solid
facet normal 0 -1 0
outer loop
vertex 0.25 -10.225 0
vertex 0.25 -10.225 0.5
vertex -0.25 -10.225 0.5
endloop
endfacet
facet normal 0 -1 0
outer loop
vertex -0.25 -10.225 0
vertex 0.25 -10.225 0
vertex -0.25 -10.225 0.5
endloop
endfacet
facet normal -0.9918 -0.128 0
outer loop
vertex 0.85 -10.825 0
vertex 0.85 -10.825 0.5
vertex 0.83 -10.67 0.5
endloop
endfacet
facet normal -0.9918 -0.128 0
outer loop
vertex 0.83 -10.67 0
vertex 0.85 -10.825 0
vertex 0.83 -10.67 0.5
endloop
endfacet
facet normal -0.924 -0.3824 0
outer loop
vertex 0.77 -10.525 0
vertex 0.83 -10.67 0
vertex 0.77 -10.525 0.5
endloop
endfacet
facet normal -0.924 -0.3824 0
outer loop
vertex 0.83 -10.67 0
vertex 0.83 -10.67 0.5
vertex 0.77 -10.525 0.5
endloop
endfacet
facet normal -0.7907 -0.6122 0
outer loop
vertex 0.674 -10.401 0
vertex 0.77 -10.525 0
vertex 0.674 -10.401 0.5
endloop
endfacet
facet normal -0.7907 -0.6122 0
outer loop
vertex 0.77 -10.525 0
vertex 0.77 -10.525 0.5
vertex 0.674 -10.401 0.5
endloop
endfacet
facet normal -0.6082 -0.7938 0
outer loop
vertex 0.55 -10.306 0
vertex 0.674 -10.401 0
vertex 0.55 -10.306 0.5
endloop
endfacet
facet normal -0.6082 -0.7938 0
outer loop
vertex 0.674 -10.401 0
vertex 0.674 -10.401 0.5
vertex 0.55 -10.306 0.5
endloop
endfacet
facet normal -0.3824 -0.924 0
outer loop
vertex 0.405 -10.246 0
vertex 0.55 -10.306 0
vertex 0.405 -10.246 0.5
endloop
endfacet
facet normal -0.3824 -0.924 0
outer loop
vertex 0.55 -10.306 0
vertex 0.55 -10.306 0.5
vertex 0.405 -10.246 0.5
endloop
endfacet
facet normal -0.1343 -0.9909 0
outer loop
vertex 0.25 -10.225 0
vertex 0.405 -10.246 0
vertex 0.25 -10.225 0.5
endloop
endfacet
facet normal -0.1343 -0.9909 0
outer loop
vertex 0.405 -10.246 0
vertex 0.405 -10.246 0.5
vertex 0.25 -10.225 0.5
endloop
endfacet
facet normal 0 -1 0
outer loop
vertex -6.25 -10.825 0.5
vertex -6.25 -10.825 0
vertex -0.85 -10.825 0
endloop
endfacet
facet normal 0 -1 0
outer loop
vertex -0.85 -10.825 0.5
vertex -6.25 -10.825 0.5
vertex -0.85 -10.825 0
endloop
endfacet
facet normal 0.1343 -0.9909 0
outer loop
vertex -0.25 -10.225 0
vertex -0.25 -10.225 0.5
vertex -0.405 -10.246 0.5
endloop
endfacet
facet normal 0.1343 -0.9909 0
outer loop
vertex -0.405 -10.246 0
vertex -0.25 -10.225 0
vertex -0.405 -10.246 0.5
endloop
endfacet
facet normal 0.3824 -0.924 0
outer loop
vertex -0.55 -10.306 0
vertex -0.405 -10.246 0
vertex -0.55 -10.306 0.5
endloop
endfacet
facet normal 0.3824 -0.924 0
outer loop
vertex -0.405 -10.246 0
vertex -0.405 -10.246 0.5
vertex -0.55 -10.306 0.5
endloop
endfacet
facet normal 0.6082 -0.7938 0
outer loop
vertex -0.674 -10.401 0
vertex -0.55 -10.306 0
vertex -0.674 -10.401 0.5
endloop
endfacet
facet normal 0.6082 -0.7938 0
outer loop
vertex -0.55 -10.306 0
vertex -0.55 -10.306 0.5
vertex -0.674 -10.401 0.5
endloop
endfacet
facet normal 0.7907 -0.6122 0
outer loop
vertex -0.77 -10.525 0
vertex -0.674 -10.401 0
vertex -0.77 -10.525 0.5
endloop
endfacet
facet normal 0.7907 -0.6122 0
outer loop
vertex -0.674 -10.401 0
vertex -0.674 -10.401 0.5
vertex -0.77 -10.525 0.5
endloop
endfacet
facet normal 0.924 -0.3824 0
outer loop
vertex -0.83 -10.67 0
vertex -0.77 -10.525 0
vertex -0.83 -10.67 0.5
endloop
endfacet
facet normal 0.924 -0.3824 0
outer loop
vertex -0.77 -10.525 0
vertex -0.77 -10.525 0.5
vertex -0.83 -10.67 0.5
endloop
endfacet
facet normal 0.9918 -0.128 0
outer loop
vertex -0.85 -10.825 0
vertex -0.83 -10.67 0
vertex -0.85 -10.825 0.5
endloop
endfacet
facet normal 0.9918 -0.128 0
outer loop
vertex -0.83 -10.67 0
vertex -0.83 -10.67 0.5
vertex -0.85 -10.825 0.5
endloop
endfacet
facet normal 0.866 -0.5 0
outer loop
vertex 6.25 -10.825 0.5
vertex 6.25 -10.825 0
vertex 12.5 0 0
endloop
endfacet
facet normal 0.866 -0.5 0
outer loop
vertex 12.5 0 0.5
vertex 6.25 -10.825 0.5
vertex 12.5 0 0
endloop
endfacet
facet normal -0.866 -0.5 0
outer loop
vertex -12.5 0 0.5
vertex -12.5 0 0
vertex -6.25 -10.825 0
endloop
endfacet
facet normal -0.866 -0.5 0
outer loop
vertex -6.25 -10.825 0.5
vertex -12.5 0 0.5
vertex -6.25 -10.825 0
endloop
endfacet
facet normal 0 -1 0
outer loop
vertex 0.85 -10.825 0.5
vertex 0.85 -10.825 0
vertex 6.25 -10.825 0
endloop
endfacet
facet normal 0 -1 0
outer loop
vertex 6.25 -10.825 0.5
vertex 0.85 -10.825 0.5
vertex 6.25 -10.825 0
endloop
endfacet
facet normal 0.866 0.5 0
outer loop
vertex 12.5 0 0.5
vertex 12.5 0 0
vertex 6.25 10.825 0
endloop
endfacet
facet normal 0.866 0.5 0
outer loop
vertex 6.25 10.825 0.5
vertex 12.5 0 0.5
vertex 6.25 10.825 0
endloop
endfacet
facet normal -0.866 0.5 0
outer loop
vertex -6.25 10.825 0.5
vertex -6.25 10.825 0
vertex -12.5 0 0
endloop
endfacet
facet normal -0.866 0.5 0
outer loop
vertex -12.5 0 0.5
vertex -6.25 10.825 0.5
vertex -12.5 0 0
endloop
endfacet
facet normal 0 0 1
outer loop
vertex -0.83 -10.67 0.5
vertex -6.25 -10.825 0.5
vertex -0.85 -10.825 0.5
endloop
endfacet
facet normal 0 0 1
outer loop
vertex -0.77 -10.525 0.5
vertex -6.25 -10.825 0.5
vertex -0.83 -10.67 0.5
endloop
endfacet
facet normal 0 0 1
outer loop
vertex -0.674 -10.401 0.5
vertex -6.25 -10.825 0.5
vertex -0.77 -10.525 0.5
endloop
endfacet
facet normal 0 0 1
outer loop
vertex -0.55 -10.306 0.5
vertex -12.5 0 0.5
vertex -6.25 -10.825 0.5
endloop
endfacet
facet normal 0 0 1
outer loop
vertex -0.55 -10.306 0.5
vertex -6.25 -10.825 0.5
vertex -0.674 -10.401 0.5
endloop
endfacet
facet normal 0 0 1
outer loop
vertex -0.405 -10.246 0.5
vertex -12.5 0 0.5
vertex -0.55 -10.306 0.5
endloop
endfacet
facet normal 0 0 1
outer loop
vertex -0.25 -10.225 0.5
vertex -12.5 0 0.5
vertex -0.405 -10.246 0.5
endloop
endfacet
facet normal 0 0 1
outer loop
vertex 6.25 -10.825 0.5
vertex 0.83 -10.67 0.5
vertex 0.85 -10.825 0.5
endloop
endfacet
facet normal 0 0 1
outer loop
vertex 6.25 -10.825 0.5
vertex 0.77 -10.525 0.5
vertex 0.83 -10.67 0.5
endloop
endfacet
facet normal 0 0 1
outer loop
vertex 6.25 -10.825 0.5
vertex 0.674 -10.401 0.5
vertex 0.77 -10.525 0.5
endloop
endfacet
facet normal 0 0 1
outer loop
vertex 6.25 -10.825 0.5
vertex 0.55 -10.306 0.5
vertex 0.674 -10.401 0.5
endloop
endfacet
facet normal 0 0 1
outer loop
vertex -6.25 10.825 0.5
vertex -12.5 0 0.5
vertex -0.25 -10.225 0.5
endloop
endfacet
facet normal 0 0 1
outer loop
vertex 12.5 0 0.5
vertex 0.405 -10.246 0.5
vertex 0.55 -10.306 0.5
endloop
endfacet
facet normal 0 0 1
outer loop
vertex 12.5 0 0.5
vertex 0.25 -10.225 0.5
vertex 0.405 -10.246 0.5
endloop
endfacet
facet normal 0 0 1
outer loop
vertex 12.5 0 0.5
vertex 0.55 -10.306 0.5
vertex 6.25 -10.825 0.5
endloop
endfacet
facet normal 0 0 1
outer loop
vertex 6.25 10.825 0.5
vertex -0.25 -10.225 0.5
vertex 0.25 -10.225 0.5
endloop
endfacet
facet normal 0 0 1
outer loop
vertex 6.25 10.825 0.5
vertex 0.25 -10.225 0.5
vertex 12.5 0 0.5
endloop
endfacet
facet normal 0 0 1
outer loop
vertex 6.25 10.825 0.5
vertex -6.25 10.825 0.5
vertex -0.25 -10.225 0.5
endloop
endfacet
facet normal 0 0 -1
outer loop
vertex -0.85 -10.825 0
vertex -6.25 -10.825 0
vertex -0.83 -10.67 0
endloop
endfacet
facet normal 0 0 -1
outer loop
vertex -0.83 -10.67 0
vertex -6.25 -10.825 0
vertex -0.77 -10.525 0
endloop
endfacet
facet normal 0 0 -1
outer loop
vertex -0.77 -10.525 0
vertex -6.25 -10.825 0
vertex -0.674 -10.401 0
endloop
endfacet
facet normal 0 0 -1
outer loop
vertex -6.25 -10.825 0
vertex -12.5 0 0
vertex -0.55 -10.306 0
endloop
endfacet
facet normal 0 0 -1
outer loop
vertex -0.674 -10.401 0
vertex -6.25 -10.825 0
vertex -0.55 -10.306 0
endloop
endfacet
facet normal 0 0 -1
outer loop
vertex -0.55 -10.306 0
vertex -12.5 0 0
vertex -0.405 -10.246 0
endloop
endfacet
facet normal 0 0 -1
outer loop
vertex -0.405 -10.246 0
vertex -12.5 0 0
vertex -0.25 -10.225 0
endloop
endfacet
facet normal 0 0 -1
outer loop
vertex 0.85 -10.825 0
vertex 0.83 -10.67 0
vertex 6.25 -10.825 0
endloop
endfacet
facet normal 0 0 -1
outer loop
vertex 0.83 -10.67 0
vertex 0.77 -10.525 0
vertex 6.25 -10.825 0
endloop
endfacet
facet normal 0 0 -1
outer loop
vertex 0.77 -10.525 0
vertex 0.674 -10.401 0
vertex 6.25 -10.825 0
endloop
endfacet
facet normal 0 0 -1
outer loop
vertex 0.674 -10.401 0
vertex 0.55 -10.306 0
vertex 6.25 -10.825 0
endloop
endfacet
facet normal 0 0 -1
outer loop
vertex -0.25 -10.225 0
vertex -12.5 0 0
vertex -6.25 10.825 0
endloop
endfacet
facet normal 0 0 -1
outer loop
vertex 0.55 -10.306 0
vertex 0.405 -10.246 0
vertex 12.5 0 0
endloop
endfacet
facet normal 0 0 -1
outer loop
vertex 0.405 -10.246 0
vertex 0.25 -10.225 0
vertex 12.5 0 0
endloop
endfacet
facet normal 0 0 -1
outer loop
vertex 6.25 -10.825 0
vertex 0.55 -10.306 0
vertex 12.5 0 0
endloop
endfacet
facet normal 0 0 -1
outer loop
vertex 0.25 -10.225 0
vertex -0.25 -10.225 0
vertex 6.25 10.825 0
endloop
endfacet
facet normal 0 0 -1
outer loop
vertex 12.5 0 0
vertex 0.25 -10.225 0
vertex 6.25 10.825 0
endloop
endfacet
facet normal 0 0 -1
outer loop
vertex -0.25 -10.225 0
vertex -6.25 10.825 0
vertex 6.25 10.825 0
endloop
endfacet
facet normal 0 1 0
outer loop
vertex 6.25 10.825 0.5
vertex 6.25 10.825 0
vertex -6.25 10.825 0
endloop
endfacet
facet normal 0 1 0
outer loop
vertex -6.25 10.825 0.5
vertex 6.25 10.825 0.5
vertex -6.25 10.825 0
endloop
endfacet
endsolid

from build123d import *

# Parameters (mm, degrees)
F1_DEPTH = 0.5
F3_DEPTH = 0.501


with BuildPart() as f1:
    # F0 (on Top) → F1 (new body)
    with BuildSketch(Plane.XY):
        Polygon((6.25, -10.825318), (12.5, 0), (6.25, 10.825318), (-6.25, 10.825318), (-12.5, 0), (-6.25, -10.825318), align=None)
    extrude(amount=F1_DEPTH)

    # F2 (on face) → F3 (cut, through all)
    with BuildSketch(Plane.XY.offset(0.5)):
        with BuildLine():
            ThreePointArc((0.85, -10.825318), (0.674264, -10.401053), (0.25, -10.225318))
            Line((0.25, -10.225318), (-0.25, -10.225318))
            ThreePointArc((-0.25, -10.225318), (-0.674264, -10.401053), (-0.85, -10.825318))
            Line((-0.85, -10.825318), (0.85, -10.825318))
        make_face()
    extrude(amount=-F3_DEPTH, mode=Mode.SUBTRACT)


solid = f1.part
